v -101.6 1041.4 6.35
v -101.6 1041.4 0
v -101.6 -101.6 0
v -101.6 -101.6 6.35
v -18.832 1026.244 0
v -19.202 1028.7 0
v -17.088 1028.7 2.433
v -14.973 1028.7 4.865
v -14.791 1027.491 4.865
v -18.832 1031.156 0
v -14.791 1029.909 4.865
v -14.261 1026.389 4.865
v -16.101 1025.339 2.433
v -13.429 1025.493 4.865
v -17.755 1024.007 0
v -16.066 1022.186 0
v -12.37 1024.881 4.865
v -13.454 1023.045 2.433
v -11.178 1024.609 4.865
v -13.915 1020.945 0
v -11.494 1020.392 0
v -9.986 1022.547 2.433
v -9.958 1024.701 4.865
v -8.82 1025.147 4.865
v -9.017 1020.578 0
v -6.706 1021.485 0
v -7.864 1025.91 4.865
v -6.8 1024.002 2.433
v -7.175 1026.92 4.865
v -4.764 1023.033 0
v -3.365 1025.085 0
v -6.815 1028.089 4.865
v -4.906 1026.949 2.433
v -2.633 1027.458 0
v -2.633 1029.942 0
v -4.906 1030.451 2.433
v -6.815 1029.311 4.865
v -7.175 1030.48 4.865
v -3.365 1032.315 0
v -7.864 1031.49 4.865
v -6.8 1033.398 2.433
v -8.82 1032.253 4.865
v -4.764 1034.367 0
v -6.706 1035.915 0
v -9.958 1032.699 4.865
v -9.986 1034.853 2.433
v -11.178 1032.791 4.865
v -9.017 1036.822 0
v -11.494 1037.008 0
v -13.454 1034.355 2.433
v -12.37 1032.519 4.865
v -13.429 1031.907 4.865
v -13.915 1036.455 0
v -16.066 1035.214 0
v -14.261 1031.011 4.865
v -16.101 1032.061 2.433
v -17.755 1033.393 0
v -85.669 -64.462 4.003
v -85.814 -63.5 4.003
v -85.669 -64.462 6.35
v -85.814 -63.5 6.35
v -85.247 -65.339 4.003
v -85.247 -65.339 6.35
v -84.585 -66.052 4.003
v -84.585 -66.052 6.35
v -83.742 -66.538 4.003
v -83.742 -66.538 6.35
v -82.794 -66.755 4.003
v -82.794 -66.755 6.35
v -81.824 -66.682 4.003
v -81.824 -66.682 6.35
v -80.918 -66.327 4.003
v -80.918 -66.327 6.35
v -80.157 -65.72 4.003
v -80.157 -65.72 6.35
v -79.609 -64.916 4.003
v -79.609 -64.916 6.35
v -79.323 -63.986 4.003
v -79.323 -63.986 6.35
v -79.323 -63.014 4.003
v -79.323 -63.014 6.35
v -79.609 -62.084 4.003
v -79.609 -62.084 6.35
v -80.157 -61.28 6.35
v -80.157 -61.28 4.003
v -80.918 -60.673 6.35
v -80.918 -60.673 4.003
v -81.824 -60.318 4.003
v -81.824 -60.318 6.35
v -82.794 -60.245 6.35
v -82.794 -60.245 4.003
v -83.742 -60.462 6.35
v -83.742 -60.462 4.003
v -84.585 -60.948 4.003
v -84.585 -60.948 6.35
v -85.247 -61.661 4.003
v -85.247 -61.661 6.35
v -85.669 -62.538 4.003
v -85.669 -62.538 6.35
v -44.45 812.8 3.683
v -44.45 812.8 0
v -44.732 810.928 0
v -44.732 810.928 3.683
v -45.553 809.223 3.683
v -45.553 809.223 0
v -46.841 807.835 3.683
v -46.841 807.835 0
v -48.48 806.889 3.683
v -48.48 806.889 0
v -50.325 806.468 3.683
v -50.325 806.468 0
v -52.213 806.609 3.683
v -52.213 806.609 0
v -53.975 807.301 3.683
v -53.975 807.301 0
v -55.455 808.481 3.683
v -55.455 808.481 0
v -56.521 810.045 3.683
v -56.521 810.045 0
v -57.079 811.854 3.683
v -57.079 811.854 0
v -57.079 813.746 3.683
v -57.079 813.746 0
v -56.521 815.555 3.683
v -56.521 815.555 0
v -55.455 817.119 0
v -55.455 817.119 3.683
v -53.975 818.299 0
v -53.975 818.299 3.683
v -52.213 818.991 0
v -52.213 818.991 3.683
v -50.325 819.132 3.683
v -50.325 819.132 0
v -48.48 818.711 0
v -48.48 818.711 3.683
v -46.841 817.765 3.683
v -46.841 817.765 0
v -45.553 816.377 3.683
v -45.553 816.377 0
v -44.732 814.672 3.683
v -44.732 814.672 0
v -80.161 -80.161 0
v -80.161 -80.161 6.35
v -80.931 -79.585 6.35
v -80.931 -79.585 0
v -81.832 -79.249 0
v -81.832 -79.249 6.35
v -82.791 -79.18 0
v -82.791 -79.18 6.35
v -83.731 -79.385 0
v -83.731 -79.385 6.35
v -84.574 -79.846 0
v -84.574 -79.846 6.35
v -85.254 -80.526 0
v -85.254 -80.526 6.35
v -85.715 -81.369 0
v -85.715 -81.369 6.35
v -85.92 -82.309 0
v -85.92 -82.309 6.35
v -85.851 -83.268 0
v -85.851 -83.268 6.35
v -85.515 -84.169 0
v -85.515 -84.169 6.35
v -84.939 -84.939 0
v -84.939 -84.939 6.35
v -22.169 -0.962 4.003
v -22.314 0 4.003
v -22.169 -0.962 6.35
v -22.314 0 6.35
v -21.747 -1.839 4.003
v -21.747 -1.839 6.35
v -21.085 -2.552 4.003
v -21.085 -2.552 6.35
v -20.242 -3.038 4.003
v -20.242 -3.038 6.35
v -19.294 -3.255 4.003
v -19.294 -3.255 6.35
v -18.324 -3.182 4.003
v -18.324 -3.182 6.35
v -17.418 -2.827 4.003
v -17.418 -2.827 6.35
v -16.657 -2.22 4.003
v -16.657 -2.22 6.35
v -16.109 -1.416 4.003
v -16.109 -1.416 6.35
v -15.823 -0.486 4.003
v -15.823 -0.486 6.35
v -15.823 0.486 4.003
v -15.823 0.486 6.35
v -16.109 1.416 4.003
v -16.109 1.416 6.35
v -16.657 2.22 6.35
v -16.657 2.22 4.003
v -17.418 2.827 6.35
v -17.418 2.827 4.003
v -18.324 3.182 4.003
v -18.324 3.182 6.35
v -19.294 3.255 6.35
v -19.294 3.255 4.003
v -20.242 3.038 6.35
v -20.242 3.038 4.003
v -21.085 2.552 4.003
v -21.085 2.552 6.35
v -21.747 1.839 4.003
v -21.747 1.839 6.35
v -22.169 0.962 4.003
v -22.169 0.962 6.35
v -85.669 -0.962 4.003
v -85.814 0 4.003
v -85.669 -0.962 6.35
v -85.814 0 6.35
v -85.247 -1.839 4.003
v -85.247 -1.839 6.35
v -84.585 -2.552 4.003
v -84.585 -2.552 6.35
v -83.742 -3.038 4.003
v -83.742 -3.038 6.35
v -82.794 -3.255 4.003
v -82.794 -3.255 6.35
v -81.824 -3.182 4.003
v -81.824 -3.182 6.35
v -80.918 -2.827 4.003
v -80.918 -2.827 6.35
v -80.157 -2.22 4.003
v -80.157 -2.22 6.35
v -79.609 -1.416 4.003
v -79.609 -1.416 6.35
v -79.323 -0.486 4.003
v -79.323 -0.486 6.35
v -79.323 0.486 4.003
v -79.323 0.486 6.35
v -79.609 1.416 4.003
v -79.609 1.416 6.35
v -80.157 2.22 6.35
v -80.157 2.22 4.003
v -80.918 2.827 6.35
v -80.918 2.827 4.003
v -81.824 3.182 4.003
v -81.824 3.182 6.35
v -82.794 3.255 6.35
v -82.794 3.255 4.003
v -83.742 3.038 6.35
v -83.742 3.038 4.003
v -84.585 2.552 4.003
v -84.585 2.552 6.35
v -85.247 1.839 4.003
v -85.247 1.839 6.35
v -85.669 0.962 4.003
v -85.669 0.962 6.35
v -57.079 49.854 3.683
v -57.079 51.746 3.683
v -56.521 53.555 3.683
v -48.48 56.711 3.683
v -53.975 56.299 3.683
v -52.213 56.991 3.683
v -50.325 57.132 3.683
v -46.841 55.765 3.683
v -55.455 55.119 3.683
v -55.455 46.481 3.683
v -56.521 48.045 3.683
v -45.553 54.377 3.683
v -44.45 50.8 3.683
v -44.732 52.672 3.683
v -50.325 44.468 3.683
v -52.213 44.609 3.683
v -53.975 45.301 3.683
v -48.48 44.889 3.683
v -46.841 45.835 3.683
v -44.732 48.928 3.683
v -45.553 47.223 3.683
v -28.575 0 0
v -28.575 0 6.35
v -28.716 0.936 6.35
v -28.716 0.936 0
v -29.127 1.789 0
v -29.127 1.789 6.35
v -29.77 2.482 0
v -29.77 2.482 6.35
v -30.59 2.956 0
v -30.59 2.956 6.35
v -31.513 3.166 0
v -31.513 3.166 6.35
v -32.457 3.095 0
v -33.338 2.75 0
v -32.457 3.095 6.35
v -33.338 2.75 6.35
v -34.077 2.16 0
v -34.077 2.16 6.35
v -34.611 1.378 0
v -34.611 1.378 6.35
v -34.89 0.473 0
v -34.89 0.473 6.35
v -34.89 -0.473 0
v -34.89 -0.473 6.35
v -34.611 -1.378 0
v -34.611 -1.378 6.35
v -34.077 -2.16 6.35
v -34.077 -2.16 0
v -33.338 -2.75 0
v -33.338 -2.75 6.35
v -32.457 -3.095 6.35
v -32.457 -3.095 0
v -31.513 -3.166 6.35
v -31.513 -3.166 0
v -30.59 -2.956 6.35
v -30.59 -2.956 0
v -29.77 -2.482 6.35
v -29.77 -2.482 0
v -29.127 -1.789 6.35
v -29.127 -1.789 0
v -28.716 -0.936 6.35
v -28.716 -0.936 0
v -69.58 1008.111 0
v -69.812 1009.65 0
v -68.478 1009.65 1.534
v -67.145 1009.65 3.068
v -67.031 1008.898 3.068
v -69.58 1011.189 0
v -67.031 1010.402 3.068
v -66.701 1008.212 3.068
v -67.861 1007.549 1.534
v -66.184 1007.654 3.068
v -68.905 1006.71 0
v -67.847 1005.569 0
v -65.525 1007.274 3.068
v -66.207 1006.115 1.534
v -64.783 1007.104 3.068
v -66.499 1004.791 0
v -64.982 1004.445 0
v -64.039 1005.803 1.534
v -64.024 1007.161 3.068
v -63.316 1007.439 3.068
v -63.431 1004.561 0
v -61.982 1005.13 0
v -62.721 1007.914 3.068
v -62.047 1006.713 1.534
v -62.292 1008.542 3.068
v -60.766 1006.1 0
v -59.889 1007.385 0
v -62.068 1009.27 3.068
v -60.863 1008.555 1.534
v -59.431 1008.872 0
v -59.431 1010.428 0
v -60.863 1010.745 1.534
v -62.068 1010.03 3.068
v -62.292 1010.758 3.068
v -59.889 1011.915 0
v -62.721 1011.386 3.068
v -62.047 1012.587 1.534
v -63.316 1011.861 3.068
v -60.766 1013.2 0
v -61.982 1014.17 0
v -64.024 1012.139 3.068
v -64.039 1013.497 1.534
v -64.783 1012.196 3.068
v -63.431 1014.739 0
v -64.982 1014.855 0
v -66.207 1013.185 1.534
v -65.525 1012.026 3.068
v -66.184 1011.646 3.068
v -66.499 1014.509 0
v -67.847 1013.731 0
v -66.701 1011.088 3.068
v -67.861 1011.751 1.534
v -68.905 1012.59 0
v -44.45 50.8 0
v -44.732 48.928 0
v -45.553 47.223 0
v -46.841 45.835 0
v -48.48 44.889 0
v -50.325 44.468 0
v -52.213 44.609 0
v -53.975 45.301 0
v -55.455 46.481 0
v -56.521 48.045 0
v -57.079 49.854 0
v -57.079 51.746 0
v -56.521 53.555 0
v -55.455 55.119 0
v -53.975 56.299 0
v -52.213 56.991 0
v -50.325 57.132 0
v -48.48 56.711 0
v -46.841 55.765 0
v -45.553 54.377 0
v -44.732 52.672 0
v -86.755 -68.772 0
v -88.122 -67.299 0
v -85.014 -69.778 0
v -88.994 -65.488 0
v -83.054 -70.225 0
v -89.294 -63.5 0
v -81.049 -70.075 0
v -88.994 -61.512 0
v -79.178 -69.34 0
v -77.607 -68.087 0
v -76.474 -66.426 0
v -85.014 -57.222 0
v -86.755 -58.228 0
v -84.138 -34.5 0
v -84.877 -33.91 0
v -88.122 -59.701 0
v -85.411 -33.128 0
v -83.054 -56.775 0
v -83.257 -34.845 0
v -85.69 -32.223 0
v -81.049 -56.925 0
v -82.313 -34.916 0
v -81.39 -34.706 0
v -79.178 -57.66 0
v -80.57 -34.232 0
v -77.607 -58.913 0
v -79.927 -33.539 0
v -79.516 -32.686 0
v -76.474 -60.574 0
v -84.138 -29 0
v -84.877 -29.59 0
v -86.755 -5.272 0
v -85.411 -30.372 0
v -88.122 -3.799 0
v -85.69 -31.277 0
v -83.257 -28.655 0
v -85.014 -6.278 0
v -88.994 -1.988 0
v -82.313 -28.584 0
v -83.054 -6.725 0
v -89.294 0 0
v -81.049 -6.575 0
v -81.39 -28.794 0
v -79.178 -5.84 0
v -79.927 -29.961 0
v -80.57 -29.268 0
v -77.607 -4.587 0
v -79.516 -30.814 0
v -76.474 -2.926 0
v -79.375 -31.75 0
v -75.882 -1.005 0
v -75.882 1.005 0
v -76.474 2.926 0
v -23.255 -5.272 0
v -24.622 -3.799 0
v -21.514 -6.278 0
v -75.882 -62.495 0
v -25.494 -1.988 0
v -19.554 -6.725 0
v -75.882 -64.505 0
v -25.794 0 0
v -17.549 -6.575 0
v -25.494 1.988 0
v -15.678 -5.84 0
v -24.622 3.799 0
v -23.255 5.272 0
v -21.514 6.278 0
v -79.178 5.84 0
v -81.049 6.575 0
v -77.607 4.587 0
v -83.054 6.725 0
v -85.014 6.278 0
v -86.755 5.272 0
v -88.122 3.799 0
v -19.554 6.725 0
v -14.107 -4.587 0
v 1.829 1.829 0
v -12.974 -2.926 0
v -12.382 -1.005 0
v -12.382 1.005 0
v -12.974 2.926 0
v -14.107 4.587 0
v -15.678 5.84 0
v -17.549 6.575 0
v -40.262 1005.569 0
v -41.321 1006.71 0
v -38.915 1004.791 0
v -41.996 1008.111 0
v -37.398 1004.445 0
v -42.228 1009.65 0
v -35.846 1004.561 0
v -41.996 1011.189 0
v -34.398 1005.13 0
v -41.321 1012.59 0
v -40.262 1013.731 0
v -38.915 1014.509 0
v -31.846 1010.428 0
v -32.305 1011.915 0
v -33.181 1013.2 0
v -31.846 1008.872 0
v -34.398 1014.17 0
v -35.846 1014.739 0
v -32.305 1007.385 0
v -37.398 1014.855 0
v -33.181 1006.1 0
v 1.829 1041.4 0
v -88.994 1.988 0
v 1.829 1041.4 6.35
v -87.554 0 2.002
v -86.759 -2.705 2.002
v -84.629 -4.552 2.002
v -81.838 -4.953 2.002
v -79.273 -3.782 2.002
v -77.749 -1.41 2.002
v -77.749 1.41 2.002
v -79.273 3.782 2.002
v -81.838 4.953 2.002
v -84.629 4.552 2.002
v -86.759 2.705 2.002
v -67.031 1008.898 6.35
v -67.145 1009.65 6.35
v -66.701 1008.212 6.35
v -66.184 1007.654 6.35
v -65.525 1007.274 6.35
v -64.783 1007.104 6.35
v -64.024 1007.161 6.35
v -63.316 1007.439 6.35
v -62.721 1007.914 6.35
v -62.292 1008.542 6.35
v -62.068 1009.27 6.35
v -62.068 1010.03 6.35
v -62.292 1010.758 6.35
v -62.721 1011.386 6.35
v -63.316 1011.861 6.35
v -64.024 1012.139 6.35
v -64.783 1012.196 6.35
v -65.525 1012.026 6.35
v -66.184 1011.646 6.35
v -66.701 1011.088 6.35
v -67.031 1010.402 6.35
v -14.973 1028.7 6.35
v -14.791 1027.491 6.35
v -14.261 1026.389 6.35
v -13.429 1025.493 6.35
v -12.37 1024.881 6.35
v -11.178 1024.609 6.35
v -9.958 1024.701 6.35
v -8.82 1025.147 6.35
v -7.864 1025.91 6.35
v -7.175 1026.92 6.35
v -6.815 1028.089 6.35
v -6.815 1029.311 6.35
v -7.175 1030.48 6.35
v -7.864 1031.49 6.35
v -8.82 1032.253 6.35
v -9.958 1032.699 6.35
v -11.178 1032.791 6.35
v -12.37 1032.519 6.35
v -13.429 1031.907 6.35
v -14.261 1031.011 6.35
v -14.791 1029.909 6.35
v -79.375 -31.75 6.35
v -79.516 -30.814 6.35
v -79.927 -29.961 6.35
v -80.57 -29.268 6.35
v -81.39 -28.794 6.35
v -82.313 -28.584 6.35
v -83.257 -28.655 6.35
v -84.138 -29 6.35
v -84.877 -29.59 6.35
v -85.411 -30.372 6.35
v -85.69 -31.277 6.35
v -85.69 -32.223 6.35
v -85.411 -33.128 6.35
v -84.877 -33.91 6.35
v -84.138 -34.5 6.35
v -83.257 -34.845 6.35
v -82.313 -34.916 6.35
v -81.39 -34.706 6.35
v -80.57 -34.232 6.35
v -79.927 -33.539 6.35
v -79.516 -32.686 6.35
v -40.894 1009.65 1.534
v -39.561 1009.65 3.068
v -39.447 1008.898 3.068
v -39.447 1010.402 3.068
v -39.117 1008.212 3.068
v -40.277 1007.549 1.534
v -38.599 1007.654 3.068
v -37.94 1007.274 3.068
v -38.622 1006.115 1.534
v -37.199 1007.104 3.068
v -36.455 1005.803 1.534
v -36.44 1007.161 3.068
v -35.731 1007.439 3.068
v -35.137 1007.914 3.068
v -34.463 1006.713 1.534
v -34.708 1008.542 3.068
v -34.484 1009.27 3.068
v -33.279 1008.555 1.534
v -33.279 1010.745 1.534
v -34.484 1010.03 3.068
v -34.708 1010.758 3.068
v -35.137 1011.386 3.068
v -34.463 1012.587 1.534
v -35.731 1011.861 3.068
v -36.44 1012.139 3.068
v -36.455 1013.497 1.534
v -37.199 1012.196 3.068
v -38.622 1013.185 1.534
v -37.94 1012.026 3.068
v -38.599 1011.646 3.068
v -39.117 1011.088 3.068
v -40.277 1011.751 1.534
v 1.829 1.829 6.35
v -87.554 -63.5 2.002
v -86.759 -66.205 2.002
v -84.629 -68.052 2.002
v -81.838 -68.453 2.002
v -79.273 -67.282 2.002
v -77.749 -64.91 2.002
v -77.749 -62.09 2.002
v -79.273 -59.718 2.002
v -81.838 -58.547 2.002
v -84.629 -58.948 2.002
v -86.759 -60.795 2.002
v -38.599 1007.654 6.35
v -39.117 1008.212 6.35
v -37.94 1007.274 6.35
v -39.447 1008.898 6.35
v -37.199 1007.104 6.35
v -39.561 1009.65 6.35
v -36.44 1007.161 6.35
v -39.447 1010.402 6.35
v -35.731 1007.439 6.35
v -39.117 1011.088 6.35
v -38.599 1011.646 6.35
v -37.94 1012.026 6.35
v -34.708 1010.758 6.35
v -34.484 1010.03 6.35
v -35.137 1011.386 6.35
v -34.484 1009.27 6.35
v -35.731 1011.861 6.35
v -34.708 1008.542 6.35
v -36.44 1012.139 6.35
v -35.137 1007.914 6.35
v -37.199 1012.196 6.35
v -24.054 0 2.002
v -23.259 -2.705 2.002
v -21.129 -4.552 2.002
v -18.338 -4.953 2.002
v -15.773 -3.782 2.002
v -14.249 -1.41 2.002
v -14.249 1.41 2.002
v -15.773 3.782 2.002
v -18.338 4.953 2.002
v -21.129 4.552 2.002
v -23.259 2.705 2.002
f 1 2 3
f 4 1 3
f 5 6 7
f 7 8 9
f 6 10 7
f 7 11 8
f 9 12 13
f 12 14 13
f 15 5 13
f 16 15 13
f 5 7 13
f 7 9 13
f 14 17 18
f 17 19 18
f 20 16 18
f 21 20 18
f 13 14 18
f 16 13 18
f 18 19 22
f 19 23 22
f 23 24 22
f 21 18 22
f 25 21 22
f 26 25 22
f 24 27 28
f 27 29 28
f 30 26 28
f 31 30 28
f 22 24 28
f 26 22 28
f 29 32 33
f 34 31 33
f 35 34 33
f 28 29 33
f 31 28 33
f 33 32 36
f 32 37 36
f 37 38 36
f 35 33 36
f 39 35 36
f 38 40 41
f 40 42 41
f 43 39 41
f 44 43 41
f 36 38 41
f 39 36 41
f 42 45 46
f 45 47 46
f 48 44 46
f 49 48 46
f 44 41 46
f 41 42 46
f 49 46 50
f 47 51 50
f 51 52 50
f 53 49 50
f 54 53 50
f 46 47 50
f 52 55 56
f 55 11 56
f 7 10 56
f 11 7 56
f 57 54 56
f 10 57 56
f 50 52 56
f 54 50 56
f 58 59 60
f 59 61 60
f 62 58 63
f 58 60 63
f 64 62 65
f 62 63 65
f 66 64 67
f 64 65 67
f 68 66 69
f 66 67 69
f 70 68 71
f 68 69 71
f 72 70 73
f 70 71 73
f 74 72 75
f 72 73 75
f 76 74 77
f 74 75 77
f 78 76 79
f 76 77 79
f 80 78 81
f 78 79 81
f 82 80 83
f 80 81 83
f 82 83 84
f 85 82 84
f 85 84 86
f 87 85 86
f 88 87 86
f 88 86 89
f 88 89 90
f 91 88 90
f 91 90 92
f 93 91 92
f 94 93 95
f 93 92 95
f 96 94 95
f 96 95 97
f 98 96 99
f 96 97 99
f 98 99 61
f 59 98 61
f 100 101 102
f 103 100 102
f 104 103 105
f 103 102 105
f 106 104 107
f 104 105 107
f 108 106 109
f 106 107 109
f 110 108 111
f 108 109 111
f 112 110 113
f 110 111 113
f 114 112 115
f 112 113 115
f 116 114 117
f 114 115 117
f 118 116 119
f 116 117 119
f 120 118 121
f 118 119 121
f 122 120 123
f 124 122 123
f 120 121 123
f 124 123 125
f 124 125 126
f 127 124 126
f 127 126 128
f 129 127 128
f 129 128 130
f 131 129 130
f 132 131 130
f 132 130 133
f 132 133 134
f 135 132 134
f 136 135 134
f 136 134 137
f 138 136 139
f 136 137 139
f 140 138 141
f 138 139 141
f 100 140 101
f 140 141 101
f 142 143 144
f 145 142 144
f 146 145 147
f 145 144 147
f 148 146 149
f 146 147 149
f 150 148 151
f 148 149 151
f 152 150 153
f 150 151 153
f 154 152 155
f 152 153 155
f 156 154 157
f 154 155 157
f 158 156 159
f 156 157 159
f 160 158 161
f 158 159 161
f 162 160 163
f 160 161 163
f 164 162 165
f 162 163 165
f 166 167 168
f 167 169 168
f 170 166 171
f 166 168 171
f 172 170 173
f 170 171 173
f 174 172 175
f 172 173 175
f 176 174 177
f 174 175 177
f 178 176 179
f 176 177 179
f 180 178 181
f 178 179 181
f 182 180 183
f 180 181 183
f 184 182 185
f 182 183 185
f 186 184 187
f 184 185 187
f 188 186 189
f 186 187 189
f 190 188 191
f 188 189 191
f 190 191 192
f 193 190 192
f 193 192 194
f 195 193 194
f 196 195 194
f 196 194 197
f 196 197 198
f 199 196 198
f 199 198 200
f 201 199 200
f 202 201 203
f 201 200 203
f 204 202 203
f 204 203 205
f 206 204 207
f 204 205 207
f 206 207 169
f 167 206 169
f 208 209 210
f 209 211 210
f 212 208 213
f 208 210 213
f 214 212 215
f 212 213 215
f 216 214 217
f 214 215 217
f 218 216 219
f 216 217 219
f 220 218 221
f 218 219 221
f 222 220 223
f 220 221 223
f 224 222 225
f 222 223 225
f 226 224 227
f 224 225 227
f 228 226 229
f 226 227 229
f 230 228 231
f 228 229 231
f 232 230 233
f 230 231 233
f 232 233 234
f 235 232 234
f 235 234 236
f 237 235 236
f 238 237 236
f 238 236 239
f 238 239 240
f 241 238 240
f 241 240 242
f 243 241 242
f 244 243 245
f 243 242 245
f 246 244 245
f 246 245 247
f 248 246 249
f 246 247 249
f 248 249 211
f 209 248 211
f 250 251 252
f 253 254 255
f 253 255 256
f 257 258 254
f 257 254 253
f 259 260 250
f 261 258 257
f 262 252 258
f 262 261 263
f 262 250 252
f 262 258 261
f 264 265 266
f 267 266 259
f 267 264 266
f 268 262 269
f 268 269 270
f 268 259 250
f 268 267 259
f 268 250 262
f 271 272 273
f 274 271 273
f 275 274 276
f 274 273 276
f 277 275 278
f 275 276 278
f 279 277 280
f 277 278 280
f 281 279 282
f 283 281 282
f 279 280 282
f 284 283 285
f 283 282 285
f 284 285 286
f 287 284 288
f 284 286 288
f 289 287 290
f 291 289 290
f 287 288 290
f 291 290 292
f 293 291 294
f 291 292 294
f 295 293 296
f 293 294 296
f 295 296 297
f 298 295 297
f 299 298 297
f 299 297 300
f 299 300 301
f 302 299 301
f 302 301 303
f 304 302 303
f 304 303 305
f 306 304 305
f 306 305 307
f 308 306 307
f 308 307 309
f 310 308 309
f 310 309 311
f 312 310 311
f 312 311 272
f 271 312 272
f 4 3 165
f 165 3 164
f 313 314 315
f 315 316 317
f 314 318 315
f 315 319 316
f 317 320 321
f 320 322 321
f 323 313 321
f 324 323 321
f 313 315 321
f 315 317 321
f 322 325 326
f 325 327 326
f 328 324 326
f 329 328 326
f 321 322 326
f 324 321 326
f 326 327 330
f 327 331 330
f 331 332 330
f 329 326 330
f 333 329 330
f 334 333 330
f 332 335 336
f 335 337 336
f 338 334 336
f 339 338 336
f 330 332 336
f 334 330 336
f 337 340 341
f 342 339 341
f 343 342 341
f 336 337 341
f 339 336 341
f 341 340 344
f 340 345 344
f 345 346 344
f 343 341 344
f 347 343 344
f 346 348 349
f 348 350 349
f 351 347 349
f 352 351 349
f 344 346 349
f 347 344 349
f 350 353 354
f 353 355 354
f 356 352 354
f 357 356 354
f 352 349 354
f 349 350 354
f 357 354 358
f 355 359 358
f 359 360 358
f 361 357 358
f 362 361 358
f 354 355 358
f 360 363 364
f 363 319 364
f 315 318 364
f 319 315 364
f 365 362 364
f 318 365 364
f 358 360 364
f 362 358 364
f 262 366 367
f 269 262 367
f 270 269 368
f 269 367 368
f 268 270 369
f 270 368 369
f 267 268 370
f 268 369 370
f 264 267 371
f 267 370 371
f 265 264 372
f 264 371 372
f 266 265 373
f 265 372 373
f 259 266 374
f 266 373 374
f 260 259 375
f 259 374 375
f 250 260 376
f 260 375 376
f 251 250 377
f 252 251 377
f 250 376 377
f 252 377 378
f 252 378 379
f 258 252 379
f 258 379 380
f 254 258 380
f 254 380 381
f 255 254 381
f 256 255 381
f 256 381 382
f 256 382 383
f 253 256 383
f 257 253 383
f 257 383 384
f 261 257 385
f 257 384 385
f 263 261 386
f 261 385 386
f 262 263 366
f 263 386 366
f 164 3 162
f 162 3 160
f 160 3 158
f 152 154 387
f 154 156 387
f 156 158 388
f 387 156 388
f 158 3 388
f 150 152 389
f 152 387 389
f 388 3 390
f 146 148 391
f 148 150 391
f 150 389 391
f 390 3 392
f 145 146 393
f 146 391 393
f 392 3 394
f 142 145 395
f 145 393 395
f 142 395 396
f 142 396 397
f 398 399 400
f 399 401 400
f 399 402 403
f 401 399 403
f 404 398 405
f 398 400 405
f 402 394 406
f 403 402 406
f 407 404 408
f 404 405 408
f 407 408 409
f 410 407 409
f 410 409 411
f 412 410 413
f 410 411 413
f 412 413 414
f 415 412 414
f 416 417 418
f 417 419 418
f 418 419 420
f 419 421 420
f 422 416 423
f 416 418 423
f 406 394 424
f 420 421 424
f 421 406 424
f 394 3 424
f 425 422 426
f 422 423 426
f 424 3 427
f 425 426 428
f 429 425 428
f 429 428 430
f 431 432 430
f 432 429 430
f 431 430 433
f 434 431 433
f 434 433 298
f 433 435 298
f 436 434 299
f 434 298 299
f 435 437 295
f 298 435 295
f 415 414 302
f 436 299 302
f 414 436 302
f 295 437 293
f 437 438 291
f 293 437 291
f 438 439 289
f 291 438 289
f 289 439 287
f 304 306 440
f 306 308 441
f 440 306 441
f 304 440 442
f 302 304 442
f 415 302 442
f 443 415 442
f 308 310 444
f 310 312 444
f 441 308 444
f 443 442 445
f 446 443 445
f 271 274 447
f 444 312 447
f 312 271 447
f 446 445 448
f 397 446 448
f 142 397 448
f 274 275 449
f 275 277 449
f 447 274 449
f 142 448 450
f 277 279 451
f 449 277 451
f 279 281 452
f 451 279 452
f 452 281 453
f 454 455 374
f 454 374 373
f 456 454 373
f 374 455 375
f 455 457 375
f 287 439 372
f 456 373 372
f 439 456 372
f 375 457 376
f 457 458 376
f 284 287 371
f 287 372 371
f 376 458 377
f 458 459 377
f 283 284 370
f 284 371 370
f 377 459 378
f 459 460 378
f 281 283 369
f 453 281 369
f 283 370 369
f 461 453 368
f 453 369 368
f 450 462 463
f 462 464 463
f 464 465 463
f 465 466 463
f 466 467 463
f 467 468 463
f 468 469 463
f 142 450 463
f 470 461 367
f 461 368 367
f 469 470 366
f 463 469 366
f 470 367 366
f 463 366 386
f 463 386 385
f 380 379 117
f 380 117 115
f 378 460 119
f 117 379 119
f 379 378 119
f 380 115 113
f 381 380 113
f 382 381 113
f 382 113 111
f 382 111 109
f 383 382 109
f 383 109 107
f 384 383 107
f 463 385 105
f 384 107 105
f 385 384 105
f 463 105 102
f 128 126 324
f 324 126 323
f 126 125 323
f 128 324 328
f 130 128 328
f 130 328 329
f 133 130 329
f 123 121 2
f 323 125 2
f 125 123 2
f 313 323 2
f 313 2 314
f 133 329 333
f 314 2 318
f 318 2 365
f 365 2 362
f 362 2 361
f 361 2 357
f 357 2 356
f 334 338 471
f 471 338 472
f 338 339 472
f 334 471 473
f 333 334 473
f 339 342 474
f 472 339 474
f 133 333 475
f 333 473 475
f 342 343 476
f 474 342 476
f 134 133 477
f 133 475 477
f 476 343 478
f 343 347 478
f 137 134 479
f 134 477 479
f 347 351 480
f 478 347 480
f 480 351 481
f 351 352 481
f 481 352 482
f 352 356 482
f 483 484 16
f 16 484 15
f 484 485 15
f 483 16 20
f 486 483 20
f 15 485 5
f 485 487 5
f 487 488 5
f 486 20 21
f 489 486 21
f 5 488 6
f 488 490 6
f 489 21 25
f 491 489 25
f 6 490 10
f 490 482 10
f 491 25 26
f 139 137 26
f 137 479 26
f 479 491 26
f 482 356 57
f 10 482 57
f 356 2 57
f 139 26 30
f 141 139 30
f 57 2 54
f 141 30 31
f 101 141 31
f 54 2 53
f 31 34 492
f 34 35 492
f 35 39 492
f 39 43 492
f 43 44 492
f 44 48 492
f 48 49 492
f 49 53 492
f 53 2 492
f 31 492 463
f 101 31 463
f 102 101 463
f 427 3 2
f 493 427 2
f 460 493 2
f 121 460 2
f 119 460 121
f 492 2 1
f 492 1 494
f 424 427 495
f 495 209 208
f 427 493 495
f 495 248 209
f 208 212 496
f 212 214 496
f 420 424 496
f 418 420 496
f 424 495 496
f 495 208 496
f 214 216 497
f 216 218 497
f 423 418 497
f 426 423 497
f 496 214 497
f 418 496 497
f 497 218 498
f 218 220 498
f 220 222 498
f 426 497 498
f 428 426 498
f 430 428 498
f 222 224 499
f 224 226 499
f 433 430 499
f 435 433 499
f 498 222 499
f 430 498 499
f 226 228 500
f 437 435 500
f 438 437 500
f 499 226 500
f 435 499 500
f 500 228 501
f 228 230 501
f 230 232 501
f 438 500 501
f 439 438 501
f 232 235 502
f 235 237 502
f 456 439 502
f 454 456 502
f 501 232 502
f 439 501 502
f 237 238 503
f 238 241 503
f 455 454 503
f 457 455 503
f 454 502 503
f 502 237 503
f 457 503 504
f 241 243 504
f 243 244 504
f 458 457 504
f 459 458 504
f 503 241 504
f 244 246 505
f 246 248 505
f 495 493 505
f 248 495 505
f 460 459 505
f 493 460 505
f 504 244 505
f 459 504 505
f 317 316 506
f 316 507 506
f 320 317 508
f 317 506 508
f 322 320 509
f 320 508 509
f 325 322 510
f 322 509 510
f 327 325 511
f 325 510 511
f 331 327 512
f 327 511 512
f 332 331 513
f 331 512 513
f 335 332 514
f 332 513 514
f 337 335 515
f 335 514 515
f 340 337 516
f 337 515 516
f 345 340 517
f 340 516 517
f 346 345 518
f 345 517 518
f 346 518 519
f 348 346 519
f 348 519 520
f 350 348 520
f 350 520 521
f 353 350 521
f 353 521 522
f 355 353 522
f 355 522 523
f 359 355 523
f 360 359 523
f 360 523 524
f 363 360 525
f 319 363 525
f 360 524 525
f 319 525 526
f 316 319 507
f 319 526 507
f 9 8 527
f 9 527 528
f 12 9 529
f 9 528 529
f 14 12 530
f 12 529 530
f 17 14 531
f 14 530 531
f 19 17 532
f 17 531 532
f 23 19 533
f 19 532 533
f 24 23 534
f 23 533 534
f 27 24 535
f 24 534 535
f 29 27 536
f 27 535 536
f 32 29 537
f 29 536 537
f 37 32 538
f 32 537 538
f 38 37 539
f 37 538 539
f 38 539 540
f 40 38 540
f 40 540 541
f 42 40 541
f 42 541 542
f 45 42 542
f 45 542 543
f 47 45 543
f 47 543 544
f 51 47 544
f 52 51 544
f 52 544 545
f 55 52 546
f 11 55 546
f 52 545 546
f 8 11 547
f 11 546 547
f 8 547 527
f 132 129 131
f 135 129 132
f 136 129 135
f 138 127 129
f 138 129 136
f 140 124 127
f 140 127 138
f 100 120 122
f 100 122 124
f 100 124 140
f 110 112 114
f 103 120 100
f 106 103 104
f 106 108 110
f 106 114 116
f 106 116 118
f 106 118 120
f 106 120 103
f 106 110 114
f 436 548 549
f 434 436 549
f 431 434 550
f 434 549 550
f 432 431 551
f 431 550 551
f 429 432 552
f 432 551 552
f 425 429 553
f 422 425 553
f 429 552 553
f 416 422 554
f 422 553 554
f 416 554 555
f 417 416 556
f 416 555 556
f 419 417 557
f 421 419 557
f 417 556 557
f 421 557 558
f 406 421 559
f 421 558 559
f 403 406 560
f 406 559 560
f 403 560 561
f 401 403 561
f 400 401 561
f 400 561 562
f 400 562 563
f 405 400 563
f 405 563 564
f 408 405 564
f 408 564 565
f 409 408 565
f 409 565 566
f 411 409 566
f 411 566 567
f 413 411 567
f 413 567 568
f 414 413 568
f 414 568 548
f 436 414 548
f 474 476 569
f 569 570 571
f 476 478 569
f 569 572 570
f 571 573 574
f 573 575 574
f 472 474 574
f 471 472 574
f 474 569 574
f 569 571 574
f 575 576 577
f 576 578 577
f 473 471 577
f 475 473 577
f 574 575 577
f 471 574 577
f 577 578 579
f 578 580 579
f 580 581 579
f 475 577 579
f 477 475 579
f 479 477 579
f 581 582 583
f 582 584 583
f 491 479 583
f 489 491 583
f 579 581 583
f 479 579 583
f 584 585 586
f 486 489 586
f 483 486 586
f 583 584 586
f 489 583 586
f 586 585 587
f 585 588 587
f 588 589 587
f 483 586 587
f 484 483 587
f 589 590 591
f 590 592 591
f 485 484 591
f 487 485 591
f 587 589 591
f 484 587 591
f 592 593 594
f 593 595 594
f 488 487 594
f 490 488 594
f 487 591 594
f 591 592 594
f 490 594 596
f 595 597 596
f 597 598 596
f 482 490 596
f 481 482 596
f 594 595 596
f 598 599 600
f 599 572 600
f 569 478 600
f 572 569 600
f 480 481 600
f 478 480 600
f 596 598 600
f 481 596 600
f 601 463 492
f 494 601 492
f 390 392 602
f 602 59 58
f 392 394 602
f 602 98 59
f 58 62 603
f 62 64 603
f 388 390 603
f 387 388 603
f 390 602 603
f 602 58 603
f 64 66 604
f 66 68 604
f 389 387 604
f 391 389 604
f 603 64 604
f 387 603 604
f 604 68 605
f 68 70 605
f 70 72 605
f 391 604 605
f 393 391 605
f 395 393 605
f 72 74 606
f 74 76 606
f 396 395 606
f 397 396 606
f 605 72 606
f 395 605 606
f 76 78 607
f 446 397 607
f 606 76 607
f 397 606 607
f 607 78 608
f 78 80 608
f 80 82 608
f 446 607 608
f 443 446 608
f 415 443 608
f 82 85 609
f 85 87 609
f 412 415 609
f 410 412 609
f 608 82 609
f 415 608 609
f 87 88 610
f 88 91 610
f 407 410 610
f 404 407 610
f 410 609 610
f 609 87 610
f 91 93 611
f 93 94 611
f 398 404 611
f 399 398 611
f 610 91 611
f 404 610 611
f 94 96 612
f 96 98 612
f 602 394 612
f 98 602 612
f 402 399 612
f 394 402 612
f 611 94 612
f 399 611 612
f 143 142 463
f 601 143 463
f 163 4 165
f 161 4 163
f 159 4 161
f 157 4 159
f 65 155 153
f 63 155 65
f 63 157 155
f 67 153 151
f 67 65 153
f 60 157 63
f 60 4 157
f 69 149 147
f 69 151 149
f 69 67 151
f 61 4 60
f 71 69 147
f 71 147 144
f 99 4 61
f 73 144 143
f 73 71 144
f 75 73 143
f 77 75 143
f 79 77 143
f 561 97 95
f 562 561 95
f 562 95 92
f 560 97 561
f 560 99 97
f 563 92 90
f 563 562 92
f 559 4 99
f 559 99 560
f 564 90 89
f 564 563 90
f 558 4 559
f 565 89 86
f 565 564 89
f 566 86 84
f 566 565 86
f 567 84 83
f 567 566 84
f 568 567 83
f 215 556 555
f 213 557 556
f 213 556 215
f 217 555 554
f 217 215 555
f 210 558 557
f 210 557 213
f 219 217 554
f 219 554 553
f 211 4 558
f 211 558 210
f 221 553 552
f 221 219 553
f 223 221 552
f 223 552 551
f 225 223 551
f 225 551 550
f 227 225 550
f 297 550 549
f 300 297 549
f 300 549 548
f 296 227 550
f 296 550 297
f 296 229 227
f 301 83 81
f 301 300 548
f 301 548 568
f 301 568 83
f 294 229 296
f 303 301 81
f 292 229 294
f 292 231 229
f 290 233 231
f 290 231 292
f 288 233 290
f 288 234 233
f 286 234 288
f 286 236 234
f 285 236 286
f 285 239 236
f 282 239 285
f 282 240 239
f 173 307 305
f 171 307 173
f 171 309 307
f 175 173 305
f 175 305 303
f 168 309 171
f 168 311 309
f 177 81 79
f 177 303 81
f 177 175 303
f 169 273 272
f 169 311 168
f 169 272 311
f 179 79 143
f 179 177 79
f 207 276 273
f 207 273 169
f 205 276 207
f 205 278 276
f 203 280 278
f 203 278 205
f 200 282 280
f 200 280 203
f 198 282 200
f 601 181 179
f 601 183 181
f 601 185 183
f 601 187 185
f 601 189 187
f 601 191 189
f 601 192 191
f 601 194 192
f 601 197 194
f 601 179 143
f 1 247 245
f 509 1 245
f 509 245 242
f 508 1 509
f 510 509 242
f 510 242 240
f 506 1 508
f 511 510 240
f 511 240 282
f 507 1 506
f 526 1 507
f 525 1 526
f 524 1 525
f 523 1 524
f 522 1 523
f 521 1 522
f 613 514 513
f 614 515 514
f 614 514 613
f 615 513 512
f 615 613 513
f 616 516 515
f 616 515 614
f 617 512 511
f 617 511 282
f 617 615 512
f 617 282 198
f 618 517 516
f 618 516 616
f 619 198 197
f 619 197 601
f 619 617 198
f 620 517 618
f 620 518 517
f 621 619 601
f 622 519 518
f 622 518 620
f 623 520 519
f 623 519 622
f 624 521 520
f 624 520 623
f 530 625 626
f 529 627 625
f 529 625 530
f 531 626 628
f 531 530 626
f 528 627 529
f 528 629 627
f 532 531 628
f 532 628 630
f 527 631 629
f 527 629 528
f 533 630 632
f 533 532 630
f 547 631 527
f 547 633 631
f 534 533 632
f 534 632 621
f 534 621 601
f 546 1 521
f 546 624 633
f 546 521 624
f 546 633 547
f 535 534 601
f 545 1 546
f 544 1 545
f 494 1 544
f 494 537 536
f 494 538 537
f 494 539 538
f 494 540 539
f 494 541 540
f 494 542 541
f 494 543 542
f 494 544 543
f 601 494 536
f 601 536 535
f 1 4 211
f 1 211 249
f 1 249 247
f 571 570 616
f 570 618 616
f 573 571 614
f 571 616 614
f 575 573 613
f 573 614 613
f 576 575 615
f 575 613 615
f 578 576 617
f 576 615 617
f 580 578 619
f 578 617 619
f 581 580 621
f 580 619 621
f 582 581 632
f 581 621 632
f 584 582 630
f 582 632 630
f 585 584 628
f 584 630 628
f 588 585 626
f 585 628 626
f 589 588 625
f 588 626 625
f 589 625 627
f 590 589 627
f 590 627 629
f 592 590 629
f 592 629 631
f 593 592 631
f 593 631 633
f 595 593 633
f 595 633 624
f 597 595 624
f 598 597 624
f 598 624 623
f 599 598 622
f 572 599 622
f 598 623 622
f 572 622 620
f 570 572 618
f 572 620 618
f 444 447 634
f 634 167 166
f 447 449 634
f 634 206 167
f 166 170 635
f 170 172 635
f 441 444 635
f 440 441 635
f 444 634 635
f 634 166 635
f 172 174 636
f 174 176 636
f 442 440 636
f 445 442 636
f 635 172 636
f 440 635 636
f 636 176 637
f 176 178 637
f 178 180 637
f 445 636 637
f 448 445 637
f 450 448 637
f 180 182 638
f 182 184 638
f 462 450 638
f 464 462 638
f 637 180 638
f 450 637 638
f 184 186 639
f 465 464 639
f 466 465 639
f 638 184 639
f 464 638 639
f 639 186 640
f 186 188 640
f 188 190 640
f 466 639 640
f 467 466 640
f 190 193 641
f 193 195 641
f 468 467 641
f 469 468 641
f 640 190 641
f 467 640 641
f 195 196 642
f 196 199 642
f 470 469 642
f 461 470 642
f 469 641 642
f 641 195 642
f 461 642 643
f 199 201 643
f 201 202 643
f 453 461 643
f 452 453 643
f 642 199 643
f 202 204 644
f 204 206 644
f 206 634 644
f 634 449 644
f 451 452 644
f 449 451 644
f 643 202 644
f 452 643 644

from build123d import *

# Parameters (mm, degrees)
F1_DEPTH        = 6.35
F3_D            = 6.5278
F3_CSINK_D      = 13.4874
F3_CSINK_ANGLE  = 82
F4_R            = 6.35
F5_DEPTH        = 3.683
F7_D            = 5.1054
F7_CSINK_D      = 10.4394
F7_CSINK_ANGLE  = 82
F9_D            = 6.7564
F10_R           = 3.175
F11_DEPTH       = 6.351
F12_W           = 1.8288
F12_H           = 1041.4
F13_DEPTH       = 6.35
F15_DEPTH       = 25.4
F17_D           = 8.2042
F17_CSINK_D     = 16.6624
F17_CSINK_ANGLE = 82


with BuildPart() as f1:
    # F0 (on Top) → F1 (new body)
    with BuildSketch(Plane.XY):
        Polygon((-101.6, -101.6), (0, 0), (0, 1041.4), (-101.6, 1041.4), align=None)
    extrude(amount=F1_DEPTH)

    # F3 (through all)
    with Locations(Plane(origin=(0, 0, 0), x_dir=(1, 0, 0), z_dir=(0, 0, -1))):
        with Locations((-82.55, 63.5), (-82.55, 0), (-19.05, 0)):
            CounterSinkHole(F3_D / 2, F3_CSINK_D / 2, counter_sink_angle=F3_CSINK_ANGLE)

    # F4 (on face) → F5 (cut)
    with BuildSketch(Plane(origin=(0, 0, 0), x_dir=(1, 0, 0), z_dir=(0, 0, -1))):
        with Locations((-50.8, -50.8)):
            Circle(F4_R)
        with Locations((-50.8, -812.8)):
            Circle(F4_R)
    extrude(amount=-F5_DEPTH, mode=Mode.SUBTRACT)

    # F7 (through all)
    with Locations(Plane(origin=(0, 0, 0), x_dir=(1, 0, 0), z_dir=(0, 0, -1))):
        with Locations((-37.0078, -1009.65), (-64.5922, -1009.65)):
            CounterSinkHole(F7_D / 2, F7_CSINK_D / 2, counter_sink_angle=F7_CSINK_ANGLE)

    # F9 (through all)
    with Locations(Plane(origin=(0, 0, 0), x_dir=(1, 0, 0), z_dir=(0, 0, -1))):
        with Locations((-82.55, 82.55)):
            Hole(F9_D / 2)

    # F10 (on face) → F11 (cut, through all)
    with BuildSketch(Plane.XY.offset(6.35)):
        with Locations((-82.55, -31.75)):
            Circle(F10_R)
        with Locations((-31.75, 0)):
            Circle(F10_R)
    extrude(amount=-F11_DEPTH, mode=Mode.SUBTRACT)

    # F12 (on Top) → F13 (join)
    with BuildSketch(Plane.XY):
        with Locations((0.9144, 520.7)):
            Rectangle(F12_W, F12_H)
    extrude(amount=F13_DEPTH)

    # F14 (on face) → F15 (cut)
    with BuildSketch(Plane.XY.offset(6.35)):
        Polygon((1.8288, 1.8288), (0, 0), (1.8288, 0), align=None)
    extrude(amount=-F15_DEPTH, mode=Mode.SUBTRACT)

    # F17 (through all)
    with Locations(Plane(origin=(0, 0, 0), x_dir=(1, 0, 0), z_dir=(0, 0, -1))):
        with Locations((-10.8712, -1028.7)):
            CounterSinkHole(F17_D / 2, F17_CSINK_D / 2, counter_sink_angle=F17_CSINK_ANGLE)


solid = f1.part
